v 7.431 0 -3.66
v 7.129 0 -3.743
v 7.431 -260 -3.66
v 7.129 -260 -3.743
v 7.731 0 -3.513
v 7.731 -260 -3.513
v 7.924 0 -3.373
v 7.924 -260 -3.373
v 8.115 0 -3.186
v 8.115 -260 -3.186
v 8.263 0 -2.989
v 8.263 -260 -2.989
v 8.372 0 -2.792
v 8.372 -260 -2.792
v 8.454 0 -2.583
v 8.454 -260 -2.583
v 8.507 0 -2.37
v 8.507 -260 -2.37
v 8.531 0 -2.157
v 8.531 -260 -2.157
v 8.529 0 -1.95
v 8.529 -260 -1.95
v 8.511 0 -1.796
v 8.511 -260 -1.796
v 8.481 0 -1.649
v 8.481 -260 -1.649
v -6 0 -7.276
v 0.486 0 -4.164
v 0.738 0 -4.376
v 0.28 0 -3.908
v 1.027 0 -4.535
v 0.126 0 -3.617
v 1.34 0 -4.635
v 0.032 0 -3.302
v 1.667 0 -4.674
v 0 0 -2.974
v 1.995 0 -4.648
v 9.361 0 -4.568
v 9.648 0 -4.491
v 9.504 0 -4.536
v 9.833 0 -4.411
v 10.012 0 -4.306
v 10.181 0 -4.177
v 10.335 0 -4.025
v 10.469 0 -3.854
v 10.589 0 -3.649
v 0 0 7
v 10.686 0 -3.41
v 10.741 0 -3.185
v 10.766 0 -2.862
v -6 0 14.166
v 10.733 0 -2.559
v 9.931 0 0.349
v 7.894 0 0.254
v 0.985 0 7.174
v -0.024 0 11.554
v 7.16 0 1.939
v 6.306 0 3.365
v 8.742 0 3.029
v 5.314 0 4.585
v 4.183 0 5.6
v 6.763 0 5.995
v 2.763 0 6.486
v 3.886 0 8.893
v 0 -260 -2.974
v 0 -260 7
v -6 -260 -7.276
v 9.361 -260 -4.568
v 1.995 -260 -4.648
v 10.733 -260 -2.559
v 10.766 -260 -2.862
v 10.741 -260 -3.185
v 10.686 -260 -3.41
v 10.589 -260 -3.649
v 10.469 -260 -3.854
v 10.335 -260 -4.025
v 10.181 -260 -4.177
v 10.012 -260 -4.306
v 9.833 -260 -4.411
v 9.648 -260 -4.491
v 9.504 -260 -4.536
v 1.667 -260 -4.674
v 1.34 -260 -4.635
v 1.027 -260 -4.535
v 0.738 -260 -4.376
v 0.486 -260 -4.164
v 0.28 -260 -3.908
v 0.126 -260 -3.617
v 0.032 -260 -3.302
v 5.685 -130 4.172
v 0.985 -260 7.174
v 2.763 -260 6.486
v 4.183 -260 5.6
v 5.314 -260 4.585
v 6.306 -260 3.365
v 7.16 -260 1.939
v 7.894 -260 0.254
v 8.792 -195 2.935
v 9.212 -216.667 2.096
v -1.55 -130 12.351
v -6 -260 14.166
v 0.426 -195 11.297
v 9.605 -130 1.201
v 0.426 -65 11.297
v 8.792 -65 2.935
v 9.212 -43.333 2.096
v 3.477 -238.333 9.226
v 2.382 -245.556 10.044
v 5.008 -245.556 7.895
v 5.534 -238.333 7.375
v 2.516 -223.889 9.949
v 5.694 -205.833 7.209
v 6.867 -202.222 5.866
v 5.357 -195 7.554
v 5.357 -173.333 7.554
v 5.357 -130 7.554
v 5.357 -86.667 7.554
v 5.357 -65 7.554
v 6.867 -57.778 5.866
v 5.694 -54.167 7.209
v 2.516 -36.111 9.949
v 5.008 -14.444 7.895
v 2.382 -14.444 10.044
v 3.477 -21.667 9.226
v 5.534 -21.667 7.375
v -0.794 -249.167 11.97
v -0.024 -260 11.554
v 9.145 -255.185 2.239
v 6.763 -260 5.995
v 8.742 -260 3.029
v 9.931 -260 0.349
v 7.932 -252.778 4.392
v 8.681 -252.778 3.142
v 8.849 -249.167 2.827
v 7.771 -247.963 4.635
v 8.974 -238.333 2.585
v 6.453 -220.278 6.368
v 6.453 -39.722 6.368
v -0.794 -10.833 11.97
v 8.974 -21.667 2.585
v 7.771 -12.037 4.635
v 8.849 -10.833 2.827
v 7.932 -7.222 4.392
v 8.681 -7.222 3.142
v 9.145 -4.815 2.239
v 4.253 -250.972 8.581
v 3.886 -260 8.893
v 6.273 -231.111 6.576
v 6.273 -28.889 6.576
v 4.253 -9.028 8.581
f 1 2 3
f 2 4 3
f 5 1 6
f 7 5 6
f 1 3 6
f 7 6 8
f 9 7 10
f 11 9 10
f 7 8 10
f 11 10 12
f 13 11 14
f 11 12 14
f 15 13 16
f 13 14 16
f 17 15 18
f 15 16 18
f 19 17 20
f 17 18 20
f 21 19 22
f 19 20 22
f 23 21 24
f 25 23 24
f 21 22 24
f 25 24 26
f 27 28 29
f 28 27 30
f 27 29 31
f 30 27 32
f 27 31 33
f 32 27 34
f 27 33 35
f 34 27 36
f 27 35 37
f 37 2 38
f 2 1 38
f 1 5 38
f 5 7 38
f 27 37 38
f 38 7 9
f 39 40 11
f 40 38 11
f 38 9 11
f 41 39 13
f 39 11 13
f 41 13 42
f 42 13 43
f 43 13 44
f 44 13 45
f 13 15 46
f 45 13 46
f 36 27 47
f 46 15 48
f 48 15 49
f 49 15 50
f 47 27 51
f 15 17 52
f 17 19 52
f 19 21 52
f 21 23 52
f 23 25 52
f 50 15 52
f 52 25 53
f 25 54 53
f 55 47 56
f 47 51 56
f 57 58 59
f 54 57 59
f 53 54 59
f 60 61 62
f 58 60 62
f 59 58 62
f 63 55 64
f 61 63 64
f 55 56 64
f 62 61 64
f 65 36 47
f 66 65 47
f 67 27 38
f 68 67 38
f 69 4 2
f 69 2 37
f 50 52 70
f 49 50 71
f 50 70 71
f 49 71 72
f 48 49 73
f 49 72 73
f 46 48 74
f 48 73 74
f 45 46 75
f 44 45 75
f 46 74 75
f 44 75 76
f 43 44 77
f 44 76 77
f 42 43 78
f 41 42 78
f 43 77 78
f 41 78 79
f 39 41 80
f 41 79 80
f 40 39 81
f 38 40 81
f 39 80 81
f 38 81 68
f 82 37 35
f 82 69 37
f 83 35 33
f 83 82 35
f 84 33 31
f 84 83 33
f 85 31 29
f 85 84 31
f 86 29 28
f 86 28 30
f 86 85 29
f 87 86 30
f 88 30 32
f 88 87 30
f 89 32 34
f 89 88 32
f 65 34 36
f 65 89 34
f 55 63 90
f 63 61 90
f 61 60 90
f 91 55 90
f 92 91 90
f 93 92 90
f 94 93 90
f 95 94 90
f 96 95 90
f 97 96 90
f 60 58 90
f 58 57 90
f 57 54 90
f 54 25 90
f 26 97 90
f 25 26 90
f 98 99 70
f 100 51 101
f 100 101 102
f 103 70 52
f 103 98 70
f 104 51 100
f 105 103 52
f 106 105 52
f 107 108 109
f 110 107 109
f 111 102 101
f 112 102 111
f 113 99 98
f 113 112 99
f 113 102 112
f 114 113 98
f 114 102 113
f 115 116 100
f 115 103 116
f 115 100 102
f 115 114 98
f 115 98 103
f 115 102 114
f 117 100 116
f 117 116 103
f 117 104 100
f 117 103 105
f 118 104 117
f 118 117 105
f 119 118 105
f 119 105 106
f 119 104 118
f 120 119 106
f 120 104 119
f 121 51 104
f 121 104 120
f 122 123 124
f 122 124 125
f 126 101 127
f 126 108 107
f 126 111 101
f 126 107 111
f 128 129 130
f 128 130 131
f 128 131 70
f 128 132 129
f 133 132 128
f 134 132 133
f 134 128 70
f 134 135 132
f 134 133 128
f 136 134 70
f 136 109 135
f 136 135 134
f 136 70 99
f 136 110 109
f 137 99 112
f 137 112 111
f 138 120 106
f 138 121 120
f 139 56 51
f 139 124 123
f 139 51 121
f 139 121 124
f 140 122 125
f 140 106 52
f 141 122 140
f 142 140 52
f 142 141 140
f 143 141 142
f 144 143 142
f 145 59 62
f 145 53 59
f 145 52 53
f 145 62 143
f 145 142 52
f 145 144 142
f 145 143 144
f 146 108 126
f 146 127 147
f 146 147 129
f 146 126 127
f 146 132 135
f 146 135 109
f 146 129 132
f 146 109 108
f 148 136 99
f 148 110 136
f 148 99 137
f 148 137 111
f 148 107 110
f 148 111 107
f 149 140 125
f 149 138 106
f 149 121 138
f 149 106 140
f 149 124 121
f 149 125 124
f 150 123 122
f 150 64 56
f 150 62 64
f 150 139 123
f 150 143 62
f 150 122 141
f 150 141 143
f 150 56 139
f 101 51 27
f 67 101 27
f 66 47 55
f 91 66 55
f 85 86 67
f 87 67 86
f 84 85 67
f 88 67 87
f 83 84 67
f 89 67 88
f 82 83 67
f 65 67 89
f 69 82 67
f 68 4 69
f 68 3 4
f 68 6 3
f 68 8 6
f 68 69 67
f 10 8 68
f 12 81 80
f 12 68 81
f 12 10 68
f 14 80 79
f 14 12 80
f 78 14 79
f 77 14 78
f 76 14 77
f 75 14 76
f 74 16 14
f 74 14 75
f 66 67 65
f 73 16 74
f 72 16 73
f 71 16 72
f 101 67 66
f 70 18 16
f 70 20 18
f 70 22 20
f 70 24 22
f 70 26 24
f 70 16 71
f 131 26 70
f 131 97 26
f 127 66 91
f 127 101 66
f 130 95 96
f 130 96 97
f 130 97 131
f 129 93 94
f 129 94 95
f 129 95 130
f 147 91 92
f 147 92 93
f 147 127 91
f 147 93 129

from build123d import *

# Parameters (mm, degrees)
PAD_DEPTH = 260
FILLET_R  = 1.7


with BuildPart() as part:
    # Sketch001 (on Sketch) → Pad (new body)
    with BuildSketch(Plane.XZ):
        with BuildLine():
            Line((11.041263, -4.271639), (10.832885, -3.08987))
            add(Edge.make_bspline(
                [(-6, 14.1661), (8.666682, 9.19528), (10.832885, -3.08987)],
                knots=[0, 0, 0, 1, 1, 1], degree=2))
            Line((-6, 14.1661), (-6, -7.276474))
            Line((-6, -7.276474), (11.041263, -4.271639))
        make_face()
        with BuildLine():
            Line((0, -5), (0, 7))
            Line((0, 7), (0.984808, 7.173648))
            add(Edge.make_bspline(
                [(0.984808, 7.173648), (7.306391, 5.39233), (8.86327, -3.437166)],
                knots=[0, 0, 0, 1, 1, 1], degree=2))
            Line((8.86327, -3.437166), (0, -5))
        make_face(mode=Mode.SUBTRACT)
    extrude(amount=PAD_DEPTH)

    # Fillet
    fillet_edges = [part.edges().sort_by_distance(p)[0] for p in [
        (8.86327, -130, -3.437166),
        (0, -130, -5),
        (11.041263, -130, -4.271639),
    ]]
    fillet(fillet_edges, radius=FILLET_R)


solid = part.part
